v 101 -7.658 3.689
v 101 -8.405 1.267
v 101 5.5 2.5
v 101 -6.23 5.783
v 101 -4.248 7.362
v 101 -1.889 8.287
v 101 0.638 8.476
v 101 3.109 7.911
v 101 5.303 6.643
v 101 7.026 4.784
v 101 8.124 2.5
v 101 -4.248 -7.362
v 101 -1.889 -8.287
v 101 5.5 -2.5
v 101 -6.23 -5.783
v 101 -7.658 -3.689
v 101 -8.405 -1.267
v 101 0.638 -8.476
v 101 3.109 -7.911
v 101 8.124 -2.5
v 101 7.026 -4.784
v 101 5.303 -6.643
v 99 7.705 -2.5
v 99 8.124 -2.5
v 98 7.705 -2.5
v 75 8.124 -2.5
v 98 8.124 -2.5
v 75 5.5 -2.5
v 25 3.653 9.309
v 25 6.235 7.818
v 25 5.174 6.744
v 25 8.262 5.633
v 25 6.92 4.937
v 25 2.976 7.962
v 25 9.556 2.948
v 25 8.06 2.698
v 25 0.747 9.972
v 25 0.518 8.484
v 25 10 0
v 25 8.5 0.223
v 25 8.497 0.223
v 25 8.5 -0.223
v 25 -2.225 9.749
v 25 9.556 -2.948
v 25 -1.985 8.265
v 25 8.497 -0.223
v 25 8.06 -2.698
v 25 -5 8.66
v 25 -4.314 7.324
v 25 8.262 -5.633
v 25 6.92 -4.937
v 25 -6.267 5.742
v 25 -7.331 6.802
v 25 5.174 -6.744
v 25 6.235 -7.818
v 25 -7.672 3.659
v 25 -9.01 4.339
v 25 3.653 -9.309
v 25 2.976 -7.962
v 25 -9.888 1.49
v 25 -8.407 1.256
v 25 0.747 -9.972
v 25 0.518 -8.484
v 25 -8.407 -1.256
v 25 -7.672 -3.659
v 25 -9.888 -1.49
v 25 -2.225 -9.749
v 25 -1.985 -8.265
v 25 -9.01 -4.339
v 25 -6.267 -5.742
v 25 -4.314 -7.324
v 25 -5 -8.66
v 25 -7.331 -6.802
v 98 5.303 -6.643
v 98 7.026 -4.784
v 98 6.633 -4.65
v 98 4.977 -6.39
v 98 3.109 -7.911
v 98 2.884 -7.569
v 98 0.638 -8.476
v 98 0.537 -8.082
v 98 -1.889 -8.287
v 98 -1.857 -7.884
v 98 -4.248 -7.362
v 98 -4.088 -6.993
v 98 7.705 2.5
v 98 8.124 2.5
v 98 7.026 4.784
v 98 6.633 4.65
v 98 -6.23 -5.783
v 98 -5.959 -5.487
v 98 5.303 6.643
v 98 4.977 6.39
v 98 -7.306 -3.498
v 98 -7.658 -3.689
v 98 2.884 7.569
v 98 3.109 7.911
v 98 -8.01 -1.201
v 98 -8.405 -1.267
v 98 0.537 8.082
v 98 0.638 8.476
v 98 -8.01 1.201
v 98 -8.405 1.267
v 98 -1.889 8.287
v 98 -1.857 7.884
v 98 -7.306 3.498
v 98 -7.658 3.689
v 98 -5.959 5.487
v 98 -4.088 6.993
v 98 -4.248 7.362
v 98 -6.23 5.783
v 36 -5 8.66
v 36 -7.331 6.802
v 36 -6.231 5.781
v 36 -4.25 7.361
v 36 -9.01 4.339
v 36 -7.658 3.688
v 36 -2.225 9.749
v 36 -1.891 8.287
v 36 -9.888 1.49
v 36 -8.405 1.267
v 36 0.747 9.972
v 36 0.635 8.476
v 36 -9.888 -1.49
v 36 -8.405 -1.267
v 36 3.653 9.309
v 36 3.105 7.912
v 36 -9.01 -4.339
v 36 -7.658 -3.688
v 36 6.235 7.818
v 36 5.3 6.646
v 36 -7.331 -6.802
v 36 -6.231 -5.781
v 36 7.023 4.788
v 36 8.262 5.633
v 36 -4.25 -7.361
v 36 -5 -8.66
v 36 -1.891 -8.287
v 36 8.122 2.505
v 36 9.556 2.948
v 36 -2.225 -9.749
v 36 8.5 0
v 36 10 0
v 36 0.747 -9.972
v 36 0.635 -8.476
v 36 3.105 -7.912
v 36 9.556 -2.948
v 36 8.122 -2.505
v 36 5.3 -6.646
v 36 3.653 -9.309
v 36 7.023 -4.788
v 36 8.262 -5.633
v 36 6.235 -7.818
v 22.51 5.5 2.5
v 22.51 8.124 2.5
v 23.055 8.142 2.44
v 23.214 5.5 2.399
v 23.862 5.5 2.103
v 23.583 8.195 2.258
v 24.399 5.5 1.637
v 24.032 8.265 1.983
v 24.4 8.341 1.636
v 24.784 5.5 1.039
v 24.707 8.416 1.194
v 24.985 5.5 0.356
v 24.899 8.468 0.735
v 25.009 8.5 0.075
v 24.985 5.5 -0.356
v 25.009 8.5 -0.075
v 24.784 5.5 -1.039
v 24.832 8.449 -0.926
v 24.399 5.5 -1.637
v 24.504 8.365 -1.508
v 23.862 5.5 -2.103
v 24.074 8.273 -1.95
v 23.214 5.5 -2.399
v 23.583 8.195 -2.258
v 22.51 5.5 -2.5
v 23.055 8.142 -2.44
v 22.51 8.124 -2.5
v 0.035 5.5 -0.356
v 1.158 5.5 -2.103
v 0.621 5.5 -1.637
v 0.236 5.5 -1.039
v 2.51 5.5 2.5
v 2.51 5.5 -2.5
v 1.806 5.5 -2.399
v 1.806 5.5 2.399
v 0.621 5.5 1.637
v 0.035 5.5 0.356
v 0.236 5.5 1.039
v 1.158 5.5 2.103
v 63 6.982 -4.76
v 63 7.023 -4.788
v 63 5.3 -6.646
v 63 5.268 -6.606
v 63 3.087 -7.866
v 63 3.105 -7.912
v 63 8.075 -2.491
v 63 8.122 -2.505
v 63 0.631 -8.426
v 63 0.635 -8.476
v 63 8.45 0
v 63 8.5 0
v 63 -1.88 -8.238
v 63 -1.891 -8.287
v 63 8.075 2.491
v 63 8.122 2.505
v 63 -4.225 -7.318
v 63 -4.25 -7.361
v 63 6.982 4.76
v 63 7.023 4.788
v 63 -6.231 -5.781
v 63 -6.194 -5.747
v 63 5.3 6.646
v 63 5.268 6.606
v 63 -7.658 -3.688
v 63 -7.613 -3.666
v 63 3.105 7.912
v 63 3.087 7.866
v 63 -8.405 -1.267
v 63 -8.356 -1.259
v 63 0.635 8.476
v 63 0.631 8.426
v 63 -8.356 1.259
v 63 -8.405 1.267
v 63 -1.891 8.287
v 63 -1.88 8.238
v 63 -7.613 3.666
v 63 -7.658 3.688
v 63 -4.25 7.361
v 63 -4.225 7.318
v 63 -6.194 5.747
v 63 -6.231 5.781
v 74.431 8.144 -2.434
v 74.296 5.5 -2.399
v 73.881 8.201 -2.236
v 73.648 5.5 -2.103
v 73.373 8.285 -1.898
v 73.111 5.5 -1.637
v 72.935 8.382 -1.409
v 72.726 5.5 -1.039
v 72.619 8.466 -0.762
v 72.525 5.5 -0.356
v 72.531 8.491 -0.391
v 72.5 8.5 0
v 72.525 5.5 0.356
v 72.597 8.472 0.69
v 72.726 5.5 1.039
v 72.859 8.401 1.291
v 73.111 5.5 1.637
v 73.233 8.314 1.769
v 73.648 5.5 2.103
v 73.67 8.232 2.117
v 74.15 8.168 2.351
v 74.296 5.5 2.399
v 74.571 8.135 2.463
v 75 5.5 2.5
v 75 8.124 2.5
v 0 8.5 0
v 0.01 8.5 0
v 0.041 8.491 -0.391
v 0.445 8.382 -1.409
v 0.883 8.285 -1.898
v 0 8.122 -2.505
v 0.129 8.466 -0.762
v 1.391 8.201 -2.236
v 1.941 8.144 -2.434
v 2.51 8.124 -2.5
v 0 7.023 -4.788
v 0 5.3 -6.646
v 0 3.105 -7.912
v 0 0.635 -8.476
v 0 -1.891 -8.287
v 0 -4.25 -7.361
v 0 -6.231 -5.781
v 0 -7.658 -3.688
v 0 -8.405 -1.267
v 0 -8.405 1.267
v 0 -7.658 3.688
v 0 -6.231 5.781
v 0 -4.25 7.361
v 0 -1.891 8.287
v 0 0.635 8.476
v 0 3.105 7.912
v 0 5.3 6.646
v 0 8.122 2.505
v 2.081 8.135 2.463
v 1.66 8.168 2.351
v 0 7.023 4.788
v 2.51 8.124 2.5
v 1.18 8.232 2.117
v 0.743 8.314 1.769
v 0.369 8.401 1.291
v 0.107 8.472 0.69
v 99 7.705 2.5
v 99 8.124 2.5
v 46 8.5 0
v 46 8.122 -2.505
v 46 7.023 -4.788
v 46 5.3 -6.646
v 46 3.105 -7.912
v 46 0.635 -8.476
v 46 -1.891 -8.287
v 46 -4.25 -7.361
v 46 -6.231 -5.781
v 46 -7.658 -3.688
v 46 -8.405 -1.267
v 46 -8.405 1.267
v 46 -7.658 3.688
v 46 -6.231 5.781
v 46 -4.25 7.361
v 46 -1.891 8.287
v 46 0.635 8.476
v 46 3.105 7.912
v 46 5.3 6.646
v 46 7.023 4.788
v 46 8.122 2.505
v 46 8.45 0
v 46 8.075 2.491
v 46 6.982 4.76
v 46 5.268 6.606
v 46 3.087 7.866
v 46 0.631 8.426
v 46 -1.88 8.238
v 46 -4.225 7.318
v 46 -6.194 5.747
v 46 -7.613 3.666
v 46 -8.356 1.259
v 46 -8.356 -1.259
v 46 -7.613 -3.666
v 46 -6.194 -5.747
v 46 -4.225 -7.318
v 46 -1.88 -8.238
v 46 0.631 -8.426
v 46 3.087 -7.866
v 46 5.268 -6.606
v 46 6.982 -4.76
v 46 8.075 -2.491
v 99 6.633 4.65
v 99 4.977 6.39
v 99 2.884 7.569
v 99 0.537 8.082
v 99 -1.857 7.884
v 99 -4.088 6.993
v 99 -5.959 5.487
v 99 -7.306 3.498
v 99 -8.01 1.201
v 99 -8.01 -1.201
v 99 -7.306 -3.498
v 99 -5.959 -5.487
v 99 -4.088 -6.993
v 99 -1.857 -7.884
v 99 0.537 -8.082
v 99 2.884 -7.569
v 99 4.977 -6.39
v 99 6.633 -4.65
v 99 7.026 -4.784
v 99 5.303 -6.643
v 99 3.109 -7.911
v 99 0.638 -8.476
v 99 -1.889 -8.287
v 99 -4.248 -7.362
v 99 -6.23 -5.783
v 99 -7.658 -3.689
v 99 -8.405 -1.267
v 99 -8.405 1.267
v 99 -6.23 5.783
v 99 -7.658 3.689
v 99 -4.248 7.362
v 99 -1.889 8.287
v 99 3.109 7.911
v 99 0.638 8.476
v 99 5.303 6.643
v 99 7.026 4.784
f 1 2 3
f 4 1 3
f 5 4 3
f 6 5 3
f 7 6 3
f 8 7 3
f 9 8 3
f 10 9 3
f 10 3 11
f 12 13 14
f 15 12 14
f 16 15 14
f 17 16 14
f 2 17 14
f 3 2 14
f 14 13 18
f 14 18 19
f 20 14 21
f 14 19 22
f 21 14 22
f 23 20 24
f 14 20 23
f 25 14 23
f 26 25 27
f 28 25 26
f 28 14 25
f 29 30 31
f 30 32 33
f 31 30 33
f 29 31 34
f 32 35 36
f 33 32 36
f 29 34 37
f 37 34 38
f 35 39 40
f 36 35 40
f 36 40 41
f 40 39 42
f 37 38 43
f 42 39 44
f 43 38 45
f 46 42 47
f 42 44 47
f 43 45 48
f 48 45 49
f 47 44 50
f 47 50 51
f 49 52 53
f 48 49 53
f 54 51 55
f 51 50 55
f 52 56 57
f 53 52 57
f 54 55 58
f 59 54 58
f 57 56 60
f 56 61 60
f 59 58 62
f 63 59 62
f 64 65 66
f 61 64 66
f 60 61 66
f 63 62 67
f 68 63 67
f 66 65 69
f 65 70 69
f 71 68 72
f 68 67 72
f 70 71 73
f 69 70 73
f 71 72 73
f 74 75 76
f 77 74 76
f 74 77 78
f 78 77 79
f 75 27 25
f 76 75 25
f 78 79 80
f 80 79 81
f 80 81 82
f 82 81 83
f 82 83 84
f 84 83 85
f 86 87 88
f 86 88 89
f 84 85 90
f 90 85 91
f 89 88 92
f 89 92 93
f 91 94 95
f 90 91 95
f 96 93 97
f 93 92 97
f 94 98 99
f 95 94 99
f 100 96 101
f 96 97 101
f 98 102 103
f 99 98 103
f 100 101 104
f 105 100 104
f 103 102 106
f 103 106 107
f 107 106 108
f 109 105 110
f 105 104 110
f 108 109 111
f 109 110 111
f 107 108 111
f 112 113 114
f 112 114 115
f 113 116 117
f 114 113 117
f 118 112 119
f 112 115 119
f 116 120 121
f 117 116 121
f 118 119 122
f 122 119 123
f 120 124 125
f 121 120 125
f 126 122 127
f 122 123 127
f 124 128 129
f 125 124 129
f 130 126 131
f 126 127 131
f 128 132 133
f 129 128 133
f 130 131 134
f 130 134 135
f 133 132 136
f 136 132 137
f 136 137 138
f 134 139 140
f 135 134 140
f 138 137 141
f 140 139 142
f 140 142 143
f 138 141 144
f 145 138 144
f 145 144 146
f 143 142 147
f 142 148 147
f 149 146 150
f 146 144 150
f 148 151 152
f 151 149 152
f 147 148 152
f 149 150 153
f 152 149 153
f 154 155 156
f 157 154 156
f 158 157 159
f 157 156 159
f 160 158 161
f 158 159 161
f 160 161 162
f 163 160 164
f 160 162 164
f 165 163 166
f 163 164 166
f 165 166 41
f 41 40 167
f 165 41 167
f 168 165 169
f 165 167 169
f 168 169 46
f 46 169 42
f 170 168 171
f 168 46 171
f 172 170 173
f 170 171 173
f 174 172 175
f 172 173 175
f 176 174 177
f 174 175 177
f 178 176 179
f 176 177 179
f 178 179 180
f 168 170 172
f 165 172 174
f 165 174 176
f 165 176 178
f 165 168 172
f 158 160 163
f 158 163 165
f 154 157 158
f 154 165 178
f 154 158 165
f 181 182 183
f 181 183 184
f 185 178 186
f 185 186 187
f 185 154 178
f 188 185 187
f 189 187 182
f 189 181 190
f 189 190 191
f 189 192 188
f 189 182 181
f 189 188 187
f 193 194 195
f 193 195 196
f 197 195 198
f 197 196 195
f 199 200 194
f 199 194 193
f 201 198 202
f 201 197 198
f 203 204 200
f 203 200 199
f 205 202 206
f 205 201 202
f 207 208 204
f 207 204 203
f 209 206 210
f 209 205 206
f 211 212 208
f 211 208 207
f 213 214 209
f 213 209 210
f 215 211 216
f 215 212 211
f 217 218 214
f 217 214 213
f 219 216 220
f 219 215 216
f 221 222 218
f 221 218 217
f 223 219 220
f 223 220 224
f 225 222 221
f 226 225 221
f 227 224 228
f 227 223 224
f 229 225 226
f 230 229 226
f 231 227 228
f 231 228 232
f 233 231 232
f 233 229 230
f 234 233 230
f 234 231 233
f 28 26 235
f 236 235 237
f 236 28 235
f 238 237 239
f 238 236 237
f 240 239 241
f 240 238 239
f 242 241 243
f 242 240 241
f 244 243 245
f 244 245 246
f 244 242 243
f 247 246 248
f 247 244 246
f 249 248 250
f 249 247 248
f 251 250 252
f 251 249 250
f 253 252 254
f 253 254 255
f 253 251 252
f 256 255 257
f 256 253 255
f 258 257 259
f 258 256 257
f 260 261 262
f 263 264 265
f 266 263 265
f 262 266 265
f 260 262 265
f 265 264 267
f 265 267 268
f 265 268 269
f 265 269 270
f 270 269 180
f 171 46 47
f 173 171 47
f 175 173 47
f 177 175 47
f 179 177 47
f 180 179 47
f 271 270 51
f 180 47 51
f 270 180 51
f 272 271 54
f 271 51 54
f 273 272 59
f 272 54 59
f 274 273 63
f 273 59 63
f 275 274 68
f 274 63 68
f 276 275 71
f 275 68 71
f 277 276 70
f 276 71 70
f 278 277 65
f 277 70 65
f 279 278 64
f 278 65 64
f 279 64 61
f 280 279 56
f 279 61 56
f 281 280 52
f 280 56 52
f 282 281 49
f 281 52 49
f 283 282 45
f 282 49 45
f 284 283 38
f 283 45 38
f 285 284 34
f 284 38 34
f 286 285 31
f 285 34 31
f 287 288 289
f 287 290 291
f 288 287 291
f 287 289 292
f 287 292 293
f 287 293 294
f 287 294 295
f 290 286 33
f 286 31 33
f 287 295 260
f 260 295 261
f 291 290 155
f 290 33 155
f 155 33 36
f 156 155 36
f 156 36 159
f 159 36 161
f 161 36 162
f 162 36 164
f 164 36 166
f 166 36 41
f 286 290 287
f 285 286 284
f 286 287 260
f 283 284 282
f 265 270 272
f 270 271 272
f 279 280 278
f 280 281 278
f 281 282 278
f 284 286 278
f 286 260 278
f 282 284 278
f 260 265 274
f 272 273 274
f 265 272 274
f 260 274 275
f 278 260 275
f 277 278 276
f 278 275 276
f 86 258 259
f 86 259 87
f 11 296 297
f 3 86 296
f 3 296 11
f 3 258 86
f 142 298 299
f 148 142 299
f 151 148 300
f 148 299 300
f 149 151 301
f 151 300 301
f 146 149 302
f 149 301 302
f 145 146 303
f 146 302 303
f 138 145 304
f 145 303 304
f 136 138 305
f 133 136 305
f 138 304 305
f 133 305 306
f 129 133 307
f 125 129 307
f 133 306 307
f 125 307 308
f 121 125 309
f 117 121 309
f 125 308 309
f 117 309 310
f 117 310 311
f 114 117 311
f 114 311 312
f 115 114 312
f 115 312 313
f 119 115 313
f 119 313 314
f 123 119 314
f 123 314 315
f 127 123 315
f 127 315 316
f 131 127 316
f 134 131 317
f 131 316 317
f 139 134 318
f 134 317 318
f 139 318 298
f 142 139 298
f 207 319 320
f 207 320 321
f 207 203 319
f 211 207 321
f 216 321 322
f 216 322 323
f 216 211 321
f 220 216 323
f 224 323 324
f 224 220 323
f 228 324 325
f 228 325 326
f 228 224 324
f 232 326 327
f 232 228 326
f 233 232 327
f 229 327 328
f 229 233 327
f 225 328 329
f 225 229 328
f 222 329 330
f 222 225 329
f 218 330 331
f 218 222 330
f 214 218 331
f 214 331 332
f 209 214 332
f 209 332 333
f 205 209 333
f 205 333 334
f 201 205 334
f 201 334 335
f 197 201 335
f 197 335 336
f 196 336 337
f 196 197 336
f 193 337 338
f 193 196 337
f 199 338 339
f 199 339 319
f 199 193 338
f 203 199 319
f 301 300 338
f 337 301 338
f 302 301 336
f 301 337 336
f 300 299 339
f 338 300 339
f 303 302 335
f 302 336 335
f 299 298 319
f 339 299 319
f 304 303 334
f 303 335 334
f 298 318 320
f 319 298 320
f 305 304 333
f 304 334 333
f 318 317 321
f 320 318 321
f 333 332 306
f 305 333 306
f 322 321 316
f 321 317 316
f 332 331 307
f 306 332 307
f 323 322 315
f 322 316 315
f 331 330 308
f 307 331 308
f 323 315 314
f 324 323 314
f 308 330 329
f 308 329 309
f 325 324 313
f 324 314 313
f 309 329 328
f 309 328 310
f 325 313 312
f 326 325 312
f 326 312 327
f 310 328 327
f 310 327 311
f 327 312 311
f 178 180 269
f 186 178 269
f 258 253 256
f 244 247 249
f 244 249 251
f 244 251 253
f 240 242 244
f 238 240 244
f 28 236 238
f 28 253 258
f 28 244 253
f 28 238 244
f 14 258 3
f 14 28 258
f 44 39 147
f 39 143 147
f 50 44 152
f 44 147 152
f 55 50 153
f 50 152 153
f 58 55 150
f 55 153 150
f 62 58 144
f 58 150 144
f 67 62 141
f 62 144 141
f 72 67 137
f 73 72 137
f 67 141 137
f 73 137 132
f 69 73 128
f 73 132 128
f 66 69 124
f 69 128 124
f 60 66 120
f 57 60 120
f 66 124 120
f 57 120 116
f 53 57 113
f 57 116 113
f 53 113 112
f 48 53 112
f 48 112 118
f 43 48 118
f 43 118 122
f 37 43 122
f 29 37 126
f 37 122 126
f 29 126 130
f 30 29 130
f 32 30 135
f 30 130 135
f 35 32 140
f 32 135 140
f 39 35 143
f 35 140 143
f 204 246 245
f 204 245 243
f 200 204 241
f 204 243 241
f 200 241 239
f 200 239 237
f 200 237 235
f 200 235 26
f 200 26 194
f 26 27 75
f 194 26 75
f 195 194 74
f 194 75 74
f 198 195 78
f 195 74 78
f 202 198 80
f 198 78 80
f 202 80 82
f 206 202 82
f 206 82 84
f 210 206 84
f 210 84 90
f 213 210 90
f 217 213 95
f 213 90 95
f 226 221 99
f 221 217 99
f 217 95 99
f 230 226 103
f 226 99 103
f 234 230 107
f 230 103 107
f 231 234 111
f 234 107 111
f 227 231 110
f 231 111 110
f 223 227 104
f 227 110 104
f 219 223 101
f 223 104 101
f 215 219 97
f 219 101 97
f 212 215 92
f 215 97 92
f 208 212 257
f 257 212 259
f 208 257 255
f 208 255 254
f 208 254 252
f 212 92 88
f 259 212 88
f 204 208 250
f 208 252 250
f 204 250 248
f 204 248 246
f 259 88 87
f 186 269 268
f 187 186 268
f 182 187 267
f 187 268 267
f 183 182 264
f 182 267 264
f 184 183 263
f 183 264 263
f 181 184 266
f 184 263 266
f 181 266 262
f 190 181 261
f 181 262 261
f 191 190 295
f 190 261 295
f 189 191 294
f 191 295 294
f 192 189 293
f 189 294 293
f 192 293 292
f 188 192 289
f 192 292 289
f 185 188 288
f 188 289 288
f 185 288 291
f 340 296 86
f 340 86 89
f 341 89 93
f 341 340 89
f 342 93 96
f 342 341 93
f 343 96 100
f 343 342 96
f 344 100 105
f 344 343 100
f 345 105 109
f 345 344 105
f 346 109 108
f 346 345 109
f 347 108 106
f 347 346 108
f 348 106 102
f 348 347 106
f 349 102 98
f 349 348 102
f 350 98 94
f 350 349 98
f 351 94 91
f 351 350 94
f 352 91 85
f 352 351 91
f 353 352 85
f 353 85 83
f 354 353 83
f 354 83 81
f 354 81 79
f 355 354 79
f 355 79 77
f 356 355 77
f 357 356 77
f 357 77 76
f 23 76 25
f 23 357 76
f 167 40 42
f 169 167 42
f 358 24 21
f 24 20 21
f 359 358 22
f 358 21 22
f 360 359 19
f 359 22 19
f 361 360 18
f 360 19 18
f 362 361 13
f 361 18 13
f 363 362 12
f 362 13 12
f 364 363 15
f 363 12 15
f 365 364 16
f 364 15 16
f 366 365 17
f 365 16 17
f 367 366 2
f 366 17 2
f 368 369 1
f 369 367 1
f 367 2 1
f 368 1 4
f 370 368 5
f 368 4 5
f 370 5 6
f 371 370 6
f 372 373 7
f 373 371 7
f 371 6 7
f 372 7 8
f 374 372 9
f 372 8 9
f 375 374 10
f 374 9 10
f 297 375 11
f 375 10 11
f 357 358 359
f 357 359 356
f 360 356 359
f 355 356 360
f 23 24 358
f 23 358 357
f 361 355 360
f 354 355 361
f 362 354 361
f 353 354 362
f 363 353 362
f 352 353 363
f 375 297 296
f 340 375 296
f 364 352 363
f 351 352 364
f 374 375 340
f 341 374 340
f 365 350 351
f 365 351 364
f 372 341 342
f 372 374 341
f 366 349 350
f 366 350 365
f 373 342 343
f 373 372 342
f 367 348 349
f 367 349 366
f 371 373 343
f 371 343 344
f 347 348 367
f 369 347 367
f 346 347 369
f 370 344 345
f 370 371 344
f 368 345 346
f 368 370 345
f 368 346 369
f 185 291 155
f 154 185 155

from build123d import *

# Parameters (mm, degrees)
ESBO_O2_W                  = 1
ESBO_O2_H                  = 0.4
CORTE_EXTRUS_O1_DEPTH      = 104.166128162
CORTE_EXTRUS_O1_DEPTH_BACK = 3
CORTE_EXTRUS_O7_DEPTH      = 3
ESBO_O6_W                  = 17
ESBO_O6_H                  = 0.05


with BuildPart() as part:
    # Esboço1 → Revolução1 (revolve)
    with BuildSketch(Plane.XY):
        Polygon((0, 0), (0, 8.5), (25, 8.5), (25, 10), (36, 10), (36, 8.5), (101, 8.5), (101, 0), align=None)
    revolve(axis=Axis((101, 0, 0), (-1, 0, 0)))

    # Esboço2 → Corte-Revolução1 (revolve, cut)
    with BuildSketch(Plane.XY):
        with Locations((98.5, 8.3)):
            Rectangle(ESBO_O2_W, ESBO_O2_H)
    revolve(axis=Axis((0, 0, 0), (1, 0, 0)), mode=Mode.SUBTRACT)

    # Esboço3 → Corte-extrusão1 (cut, two sides: drawn at the far end of the back side and taken through both)
    with BuildSketch(Plane(origin=(0, 8.5, 0), x_dir=(1, 0, 0), z_dir=(0, 1, 0)).offset(-CORTE_EXTRUS_O1_DEPTH_BACK)):
        with BuildLine():
            Line((75, -2.5), (105, -2.5))
            ThreePointArc((105, -2.5), (107.5, 0), (105, 2.5))
            Line((105, 2.5), (75, 2.5))
            ThreePointArc((75, 2.5), (72.5, 0), (75, -2.5))
        make_face()
    extrude(amount=CORTE_EXTRUS_O1_DEPTH + CORTE_EXTRUS_O1_DEPTH_BACK, mode=Mode.SUBTRACT)

    # Esboço5 → Corte-extrusão7 (cut)
    with BuildSketch(Plane(origin=(0, 8.5, 0), x_dir=(-1, 0, 0), z_dir=(0, 1, 0))):
        with BuildLine():
            Line((-2.51, 2.5), (-22.51, 2.5))
            ThreePointArc((-22.51, 2.5), (-25.01, 0), (-22.51, -2.5))
            Line((-22.51, -2.5), (-2.51, -2.5))
            ThreePointArc((-2.51, -2.5), (-0.01, 0), (-2.51, 2.5))
        make_face()
    extrude(amount=-CORTE_EXTRUS_O7_DEPTH, mode=Mode.SUBTRACT)

    # Esboço6 → Corte-Revolução2 (revolve, cut)
    with BuildSketch(Plane(origin=(0, 0, 0), x_dir=(1, 0, 0), z_dir=(0, 1, 0)), mode=Mode.PRIVATE) as corte_revolu_o2_sk:
        with Locations((54.5, 8.475)):
            Rectangle(ESBO_O6_W, ESBO_O6_H)
    revolve(corte_revolu_o2_sk.sketch.rotate(Axis((48.876141687, 0, 0), (1, 0, 0)), 90), axis=Axis((48.876141687, 0, 0), (1, 0, 0)), mode=Mode.SUBTRACT)


solid = part.part
